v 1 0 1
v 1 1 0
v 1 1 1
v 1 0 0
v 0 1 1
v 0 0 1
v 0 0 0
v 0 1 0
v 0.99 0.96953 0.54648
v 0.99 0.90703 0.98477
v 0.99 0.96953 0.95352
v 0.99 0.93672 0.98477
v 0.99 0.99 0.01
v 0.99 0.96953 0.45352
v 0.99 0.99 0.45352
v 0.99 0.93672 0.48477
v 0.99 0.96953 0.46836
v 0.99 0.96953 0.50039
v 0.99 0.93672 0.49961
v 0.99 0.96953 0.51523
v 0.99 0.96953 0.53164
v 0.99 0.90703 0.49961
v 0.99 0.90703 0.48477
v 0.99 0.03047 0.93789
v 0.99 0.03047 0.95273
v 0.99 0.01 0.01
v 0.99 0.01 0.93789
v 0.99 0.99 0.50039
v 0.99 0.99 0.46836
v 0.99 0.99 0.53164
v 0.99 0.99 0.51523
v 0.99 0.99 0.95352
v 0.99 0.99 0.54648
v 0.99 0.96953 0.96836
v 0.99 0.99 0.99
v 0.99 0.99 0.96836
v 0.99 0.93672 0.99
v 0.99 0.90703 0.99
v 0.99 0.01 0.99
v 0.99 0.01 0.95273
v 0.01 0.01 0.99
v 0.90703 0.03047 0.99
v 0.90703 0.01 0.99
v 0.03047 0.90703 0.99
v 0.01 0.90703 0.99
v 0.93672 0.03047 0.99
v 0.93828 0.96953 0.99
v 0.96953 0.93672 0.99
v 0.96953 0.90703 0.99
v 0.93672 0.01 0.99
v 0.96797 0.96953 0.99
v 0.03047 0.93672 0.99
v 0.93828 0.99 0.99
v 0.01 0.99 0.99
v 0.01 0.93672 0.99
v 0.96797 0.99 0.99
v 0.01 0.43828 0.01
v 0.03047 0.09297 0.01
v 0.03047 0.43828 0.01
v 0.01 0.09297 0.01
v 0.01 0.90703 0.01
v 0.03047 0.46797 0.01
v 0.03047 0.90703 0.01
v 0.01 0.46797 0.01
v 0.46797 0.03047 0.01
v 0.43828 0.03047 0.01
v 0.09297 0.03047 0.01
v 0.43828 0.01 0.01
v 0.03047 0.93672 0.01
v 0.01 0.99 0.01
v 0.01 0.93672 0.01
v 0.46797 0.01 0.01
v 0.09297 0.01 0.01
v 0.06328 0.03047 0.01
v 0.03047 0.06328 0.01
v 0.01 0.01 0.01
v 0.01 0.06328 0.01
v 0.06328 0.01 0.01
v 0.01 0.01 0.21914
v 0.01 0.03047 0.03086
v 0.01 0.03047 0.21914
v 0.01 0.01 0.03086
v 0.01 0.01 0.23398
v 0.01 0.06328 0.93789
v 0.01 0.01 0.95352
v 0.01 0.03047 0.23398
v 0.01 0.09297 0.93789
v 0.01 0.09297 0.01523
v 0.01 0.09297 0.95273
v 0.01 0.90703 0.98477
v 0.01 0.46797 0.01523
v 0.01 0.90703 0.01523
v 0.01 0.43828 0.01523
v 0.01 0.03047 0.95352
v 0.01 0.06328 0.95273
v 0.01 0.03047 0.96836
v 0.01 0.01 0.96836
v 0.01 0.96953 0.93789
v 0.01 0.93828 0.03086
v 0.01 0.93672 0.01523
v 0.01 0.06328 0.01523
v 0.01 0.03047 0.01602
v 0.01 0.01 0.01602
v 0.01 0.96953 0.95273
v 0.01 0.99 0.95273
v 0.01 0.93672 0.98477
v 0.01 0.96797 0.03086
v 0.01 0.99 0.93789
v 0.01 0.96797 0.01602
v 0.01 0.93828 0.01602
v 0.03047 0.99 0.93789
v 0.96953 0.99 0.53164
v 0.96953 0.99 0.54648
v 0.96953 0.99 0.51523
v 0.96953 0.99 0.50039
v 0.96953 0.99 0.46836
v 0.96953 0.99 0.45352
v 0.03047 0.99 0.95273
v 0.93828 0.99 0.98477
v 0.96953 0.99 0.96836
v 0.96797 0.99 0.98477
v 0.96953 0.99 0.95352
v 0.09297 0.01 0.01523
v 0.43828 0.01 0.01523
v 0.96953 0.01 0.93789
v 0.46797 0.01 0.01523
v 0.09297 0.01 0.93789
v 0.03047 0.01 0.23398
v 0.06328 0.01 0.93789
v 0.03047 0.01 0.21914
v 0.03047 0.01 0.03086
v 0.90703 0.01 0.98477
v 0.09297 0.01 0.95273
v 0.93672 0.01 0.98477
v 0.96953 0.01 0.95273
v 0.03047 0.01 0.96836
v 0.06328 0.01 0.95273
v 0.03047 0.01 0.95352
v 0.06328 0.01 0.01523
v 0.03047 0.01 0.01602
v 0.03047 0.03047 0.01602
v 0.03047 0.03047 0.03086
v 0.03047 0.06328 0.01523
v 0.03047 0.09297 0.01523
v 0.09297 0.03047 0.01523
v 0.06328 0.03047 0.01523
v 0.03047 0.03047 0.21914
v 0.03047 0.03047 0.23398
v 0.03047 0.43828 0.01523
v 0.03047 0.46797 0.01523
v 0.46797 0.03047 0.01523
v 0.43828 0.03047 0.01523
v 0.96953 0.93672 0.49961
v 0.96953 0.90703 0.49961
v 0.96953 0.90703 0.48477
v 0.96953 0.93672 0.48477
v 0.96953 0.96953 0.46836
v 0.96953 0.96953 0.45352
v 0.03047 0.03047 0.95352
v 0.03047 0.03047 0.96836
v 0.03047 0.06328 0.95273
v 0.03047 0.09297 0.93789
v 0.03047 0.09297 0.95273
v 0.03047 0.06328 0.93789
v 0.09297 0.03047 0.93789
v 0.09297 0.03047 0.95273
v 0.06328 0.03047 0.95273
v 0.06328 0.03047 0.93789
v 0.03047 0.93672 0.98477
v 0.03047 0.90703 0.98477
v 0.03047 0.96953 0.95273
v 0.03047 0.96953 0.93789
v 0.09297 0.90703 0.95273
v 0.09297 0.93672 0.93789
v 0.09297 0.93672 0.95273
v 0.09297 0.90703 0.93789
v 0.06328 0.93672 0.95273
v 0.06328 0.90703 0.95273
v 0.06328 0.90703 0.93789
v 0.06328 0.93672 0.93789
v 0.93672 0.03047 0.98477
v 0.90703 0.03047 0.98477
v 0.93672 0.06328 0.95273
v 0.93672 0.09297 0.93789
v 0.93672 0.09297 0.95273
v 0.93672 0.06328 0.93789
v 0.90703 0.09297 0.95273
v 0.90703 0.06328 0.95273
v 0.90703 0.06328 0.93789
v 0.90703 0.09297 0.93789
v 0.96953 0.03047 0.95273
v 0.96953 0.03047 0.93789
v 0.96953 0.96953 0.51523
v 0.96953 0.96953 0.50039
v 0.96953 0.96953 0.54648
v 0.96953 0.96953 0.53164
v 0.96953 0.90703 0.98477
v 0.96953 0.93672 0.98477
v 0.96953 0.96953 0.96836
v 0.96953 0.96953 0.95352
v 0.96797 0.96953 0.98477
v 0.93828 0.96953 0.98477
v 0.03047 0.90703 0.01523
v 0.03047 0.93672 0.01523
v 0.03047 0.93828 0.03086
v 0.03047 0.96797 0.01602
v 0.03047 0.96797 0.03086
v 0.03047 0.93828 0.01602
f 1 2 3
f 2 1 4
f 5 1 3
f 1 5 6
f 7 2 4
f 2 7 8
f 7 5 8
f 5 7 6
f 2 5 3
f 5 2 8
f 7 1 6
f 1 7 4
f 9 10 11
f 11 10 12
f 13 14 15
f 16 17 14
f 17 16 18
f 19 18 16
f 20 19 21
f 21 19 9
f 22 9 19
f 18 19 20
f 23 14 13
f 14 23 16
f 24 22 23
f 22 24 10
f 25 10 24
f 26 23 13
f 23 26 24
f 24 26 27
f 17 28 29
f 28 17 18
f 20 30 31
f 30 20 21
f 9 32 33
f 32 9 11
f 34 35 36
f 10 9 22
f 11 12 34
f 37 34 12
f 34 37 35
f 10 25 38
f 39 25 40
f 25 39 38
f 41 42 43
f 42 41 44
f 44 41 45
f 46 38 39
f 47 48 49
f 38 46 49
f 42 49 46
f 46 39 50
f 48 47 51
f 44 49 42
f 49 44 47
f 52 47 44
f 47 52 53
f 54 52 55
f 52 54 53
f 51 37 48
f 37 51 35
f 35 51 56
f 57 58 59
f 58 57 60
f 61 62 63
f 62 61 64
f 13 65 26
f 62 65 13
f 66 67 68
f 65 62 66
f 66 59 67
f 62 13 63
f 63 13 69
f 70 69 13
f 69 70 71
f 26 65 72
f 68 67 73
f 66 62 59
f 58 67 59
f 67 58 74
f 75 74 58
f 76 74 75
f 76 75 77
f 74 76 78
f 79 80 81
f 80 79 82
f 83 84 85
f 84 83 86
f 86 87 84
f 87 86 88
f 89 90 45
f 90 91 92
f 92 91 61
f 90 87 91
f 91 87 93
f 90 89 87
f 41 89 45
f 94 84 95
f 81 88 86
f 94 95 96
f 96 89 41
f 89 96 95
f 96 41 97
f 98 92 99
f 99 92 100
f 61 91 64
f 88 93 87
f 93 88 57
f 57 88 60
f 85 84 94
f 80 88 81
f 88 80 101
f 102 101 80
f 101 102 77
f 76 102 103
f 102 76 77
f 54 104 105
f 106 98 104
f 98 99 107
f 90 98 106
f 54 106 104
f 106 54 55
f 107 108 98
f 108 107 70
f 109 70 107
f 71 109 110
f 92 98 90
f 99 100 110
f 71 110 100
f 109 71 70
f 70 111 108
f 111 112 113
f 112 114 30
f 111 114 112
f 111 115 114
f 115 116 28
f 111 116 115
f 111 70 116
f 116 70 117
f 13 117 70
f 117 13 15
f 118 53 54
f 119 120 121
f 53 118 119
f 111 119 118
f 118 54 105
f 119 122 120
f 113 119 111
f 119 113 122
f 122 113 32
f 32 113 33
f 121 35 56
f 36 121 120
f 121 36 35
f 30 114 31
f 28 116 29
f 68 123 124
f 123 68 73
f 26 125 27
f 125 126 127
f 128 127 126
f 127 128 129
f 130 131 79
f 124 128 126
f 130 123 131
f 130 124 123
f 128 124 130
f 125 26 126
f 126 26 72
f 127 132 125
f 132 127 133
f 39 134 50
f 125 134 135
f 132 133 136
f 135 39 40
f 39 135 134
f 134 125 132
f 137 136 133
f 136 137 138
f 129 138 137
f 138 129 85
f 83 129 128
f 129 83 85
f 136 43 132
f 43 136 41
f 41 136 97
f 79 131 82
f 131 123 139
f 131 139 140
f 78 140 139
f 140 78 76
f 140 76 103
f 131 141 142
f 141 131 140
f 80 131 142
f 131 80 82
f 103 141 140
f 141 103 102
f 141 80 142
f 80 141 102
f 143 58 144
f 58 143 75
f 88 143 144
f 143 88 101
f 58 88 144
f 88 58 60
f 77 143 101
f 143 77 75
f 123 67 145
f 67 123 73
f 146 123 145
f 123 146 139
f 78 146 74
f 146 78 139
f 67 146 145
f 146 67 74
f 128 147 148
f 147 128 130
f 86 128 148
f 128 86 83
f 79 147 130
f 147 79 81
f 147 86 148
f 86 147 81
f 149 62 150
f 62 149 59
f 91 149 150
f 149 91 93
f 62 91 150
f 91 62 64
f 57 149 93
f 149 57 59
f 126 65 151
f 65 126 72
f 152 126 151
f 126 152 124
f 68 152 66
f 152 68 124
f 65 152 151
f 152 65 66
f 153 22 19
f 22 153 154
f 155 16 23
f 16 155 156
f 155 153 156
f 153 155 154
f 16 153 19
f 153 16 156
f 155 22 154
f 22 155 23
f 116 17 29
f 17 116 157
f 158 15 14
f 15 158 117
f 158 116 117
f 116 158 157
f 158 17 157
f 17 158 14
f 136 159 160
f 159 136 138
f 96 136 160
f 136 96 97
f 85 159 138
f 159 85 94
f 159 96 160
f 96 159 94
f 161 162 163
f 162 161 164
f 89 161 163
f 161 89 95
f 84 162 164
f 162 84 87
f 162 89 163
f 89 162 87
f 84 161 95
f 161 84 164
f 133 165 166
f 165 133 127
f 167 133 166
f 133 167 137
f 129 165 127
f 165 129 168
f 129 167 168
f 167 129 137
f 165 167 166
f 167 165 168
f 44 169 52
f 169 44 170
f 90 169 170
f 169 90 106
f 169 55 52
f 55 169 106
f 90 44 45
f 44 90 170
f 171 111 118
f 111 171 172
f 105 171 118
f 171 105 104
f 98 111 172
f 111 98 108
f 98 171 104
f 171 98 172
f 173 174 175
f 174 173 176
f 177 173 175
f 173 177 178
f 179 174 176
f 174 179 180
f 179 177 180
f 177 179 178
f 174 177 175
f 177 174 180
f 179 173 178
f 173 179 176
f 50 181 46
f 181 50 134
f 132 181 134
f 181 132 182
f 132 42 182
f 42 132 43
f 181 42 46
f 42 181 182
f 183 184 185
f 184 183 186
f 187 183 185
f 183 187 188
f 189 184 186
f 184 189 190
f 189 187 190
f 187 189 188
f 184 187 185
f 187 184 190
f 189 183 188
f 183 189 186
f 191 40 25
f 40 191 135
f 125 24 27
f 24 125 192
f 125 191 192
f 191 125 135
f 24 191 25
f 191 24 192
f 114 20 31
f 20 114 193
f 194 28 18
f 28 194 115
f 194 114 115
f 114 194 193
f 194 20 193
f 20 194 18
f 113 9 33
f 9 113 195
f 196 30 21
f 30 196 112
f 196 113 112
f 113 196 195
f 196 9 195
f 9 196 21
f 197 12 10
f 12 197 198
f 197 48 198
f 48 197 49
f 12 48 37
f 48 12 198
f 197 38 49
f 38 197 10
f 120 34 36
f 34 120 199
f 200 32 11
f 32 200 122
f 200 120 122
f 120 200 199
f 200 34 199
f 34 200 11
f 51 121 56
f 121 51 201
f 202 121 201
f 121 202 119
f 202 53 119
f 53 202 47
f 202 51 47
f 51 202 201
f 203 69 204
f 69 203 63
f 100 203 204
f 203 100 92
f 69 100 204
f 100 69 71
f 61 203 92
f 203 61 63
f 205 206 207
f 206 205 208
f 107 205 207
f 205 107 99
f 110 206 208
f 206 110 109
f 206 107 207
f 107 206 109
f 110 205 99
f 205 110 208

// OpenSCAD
translate([0.015625, 0.015625, 0.0234375]) color([0.8391823855105408, 0.5662418331704699, 0.8483457495897468]) cube([0.0296875, 0.0296875, 0.01484375], center=true);
translate([0.015625, 0.078125, 0.0078125]) color([0.0907492855022386, 0.172381478036309, 0.2945048518552693]) cube([0.0296875, 0.0296875, 0.01484375], center=true);
translate([0.078125, 0.015625, 0.0078125]) color([0.5674771832327852, 0.7390617236796915, 0.6077812129609614]) cube([0.0296875, 0.0296875, 0.01484375], center=true);
translate([0.015625, 0.015625, 0.2265625]) color([0.8356343496999468, 0.6494934907054305, 0.32572038127985237]) cube([0.0296875, 0.0296875, 0.01484375], center=true);
translate([0.015625, 0.453125, 0.0078125]) color([0.40812215631186877, 0.24859251190541864, 0.6011744075270763]) cube([0.0296875, 0.0296875, 0.01484375], center=true);
translate([0.453125, 0.015625, 0.0078125]) color([0.51549245846849, 0.8798114652006801, 0.6362562723178095]) cube([0.0296875, 0.0296875, 0.01484375], center=true);
translate([0.984375, 0.921875, 0.4921875]) color([0.22500872519212534, 0.8579768717980989, 0.9914878316344947]) cube([0.0296875, 0.0296875, 0.01484375], center=true);
translate([0.984375, 0.984375, 0.4609375]) color([0.2800132939500575, 0.044333538529565675, 0.6998959533990192]) cube([0.0296875, 0.0296875, 0.01484375], center=true);
translate([0.015625, 0.015625, 0.9609375]) color([0.06021544158230252, 0.6698110432076612, 0.31920077197402785]) cube([0.0296875, 0.0296875, 0.01484375], center=true);
translate([0.015625, 0.078125, 0.9453125]) color([0.7627469924397148, 0.7995810714402417, 0.6049986152668421]) cube([0.0296875, 0.0296875, 0.01484375], center=true);
translate([0.078125, 0.015625, 0.9453125]) color([0.9944822642742176, 0.1058654446206696, 0.056020355042062375]) cube([0.0296875, 0.0296875, 0.01484375], center=true);
translate([0.015625, 0.921875, 0.9921875]) color([0.49880375865628845, 0.43225897139594716, 0.9734902523308799]) cube([0.0296875, 0.0296875, 0.01484375], center=true);
translate([0.015625, 0.984375, 0.9453125]) color([0.7242045921089734, 0.5461752890347371, 0.8733918912661065]) cube([0.0296875, 0.0296875, 0.01484375], center=true);
translate([0.078125, 0.921875, 0.9453125]) color([0.4858700118247665, 0.6885313298898925, 0.2841989857772992]) cube([0.0296875, 0.0296875, 0.01484375], center=true);
translate([0.921875, 0.015625, 0.9921875]) color([0.28303657398954307, 0.33896477045730966, 0.8267486659477957]) cube([0.0296875, 0.0296875, 0.01484375], center=true);
translate([0.921875, 0.078125, 0.9453125]) color([0.3660198570459987, 0.7056816781640568, 0.9324040923575997]) cube([0.0296875, 0.0296875, 0.01484375], center=true);
translate([0.984375, 0.015625, 0.9453125]) color([0.008434062962213273, 0.25966641838531823, 0.9896839070709093]) cube([0.0296875, 0.0296875, 0.01484375], center=true);
translate([0.984375, 0.984375, 0.5078125]) color([0.3562276120347111, 0.549163440597015, 0.7345698528172236]) cube([0.0296875, 0.0296875, 0.01484375], center=true);
translate([0.984375, 0.984375, 0.5390625]) color([0.732045961898085, 0.19701154166892942, 0.5962982456152792]) cube([0.0296875, 0.0296875, 0.01484375], center=true);
translate([0.984375, 0.921875, 0.9921875]) color([0.1709070674712161, 0.23454120539559253, 0.05965731709382249]) cube([0.0296875, 0.0296875, 0.01484375], center=true);
translate([0.984375, 0.984375, 0.9609375]) color([0.17047423752658786, 0.23075793389222676, 0.6940455646097671]) cube([0.0296875, 0.0296875, 0.01484375], center=true);
translate([0.953125, 0.984375, 0.9921875]) color([0.8481841538990768, 0.13634263953347525, 0.7137514688917184]) cube([0.0296875, 0.0296875, 0.01484375], center=true);
translate([0.015625, 0.921875, 0.0078125]) color([0.7915372654523524, 0.7173638361453191, 0.14113186486053086]) cube([0.0296875, 0.0296875, 0.01484375], center=true);
translate([0.015625, 0.953125, 0.0234375]) color([0.9711271602020061, 0.9890646201983848, 0.4964262388032783]) cube([0.0296875, 0.0296875, 0.01484375], center=true);
color([0.3,0.3,0.3,0.3]) difference() { cube([1,1,1]); translate([0.01,0.01,0.01]) cube([0.98,0.98,0.98]); }
